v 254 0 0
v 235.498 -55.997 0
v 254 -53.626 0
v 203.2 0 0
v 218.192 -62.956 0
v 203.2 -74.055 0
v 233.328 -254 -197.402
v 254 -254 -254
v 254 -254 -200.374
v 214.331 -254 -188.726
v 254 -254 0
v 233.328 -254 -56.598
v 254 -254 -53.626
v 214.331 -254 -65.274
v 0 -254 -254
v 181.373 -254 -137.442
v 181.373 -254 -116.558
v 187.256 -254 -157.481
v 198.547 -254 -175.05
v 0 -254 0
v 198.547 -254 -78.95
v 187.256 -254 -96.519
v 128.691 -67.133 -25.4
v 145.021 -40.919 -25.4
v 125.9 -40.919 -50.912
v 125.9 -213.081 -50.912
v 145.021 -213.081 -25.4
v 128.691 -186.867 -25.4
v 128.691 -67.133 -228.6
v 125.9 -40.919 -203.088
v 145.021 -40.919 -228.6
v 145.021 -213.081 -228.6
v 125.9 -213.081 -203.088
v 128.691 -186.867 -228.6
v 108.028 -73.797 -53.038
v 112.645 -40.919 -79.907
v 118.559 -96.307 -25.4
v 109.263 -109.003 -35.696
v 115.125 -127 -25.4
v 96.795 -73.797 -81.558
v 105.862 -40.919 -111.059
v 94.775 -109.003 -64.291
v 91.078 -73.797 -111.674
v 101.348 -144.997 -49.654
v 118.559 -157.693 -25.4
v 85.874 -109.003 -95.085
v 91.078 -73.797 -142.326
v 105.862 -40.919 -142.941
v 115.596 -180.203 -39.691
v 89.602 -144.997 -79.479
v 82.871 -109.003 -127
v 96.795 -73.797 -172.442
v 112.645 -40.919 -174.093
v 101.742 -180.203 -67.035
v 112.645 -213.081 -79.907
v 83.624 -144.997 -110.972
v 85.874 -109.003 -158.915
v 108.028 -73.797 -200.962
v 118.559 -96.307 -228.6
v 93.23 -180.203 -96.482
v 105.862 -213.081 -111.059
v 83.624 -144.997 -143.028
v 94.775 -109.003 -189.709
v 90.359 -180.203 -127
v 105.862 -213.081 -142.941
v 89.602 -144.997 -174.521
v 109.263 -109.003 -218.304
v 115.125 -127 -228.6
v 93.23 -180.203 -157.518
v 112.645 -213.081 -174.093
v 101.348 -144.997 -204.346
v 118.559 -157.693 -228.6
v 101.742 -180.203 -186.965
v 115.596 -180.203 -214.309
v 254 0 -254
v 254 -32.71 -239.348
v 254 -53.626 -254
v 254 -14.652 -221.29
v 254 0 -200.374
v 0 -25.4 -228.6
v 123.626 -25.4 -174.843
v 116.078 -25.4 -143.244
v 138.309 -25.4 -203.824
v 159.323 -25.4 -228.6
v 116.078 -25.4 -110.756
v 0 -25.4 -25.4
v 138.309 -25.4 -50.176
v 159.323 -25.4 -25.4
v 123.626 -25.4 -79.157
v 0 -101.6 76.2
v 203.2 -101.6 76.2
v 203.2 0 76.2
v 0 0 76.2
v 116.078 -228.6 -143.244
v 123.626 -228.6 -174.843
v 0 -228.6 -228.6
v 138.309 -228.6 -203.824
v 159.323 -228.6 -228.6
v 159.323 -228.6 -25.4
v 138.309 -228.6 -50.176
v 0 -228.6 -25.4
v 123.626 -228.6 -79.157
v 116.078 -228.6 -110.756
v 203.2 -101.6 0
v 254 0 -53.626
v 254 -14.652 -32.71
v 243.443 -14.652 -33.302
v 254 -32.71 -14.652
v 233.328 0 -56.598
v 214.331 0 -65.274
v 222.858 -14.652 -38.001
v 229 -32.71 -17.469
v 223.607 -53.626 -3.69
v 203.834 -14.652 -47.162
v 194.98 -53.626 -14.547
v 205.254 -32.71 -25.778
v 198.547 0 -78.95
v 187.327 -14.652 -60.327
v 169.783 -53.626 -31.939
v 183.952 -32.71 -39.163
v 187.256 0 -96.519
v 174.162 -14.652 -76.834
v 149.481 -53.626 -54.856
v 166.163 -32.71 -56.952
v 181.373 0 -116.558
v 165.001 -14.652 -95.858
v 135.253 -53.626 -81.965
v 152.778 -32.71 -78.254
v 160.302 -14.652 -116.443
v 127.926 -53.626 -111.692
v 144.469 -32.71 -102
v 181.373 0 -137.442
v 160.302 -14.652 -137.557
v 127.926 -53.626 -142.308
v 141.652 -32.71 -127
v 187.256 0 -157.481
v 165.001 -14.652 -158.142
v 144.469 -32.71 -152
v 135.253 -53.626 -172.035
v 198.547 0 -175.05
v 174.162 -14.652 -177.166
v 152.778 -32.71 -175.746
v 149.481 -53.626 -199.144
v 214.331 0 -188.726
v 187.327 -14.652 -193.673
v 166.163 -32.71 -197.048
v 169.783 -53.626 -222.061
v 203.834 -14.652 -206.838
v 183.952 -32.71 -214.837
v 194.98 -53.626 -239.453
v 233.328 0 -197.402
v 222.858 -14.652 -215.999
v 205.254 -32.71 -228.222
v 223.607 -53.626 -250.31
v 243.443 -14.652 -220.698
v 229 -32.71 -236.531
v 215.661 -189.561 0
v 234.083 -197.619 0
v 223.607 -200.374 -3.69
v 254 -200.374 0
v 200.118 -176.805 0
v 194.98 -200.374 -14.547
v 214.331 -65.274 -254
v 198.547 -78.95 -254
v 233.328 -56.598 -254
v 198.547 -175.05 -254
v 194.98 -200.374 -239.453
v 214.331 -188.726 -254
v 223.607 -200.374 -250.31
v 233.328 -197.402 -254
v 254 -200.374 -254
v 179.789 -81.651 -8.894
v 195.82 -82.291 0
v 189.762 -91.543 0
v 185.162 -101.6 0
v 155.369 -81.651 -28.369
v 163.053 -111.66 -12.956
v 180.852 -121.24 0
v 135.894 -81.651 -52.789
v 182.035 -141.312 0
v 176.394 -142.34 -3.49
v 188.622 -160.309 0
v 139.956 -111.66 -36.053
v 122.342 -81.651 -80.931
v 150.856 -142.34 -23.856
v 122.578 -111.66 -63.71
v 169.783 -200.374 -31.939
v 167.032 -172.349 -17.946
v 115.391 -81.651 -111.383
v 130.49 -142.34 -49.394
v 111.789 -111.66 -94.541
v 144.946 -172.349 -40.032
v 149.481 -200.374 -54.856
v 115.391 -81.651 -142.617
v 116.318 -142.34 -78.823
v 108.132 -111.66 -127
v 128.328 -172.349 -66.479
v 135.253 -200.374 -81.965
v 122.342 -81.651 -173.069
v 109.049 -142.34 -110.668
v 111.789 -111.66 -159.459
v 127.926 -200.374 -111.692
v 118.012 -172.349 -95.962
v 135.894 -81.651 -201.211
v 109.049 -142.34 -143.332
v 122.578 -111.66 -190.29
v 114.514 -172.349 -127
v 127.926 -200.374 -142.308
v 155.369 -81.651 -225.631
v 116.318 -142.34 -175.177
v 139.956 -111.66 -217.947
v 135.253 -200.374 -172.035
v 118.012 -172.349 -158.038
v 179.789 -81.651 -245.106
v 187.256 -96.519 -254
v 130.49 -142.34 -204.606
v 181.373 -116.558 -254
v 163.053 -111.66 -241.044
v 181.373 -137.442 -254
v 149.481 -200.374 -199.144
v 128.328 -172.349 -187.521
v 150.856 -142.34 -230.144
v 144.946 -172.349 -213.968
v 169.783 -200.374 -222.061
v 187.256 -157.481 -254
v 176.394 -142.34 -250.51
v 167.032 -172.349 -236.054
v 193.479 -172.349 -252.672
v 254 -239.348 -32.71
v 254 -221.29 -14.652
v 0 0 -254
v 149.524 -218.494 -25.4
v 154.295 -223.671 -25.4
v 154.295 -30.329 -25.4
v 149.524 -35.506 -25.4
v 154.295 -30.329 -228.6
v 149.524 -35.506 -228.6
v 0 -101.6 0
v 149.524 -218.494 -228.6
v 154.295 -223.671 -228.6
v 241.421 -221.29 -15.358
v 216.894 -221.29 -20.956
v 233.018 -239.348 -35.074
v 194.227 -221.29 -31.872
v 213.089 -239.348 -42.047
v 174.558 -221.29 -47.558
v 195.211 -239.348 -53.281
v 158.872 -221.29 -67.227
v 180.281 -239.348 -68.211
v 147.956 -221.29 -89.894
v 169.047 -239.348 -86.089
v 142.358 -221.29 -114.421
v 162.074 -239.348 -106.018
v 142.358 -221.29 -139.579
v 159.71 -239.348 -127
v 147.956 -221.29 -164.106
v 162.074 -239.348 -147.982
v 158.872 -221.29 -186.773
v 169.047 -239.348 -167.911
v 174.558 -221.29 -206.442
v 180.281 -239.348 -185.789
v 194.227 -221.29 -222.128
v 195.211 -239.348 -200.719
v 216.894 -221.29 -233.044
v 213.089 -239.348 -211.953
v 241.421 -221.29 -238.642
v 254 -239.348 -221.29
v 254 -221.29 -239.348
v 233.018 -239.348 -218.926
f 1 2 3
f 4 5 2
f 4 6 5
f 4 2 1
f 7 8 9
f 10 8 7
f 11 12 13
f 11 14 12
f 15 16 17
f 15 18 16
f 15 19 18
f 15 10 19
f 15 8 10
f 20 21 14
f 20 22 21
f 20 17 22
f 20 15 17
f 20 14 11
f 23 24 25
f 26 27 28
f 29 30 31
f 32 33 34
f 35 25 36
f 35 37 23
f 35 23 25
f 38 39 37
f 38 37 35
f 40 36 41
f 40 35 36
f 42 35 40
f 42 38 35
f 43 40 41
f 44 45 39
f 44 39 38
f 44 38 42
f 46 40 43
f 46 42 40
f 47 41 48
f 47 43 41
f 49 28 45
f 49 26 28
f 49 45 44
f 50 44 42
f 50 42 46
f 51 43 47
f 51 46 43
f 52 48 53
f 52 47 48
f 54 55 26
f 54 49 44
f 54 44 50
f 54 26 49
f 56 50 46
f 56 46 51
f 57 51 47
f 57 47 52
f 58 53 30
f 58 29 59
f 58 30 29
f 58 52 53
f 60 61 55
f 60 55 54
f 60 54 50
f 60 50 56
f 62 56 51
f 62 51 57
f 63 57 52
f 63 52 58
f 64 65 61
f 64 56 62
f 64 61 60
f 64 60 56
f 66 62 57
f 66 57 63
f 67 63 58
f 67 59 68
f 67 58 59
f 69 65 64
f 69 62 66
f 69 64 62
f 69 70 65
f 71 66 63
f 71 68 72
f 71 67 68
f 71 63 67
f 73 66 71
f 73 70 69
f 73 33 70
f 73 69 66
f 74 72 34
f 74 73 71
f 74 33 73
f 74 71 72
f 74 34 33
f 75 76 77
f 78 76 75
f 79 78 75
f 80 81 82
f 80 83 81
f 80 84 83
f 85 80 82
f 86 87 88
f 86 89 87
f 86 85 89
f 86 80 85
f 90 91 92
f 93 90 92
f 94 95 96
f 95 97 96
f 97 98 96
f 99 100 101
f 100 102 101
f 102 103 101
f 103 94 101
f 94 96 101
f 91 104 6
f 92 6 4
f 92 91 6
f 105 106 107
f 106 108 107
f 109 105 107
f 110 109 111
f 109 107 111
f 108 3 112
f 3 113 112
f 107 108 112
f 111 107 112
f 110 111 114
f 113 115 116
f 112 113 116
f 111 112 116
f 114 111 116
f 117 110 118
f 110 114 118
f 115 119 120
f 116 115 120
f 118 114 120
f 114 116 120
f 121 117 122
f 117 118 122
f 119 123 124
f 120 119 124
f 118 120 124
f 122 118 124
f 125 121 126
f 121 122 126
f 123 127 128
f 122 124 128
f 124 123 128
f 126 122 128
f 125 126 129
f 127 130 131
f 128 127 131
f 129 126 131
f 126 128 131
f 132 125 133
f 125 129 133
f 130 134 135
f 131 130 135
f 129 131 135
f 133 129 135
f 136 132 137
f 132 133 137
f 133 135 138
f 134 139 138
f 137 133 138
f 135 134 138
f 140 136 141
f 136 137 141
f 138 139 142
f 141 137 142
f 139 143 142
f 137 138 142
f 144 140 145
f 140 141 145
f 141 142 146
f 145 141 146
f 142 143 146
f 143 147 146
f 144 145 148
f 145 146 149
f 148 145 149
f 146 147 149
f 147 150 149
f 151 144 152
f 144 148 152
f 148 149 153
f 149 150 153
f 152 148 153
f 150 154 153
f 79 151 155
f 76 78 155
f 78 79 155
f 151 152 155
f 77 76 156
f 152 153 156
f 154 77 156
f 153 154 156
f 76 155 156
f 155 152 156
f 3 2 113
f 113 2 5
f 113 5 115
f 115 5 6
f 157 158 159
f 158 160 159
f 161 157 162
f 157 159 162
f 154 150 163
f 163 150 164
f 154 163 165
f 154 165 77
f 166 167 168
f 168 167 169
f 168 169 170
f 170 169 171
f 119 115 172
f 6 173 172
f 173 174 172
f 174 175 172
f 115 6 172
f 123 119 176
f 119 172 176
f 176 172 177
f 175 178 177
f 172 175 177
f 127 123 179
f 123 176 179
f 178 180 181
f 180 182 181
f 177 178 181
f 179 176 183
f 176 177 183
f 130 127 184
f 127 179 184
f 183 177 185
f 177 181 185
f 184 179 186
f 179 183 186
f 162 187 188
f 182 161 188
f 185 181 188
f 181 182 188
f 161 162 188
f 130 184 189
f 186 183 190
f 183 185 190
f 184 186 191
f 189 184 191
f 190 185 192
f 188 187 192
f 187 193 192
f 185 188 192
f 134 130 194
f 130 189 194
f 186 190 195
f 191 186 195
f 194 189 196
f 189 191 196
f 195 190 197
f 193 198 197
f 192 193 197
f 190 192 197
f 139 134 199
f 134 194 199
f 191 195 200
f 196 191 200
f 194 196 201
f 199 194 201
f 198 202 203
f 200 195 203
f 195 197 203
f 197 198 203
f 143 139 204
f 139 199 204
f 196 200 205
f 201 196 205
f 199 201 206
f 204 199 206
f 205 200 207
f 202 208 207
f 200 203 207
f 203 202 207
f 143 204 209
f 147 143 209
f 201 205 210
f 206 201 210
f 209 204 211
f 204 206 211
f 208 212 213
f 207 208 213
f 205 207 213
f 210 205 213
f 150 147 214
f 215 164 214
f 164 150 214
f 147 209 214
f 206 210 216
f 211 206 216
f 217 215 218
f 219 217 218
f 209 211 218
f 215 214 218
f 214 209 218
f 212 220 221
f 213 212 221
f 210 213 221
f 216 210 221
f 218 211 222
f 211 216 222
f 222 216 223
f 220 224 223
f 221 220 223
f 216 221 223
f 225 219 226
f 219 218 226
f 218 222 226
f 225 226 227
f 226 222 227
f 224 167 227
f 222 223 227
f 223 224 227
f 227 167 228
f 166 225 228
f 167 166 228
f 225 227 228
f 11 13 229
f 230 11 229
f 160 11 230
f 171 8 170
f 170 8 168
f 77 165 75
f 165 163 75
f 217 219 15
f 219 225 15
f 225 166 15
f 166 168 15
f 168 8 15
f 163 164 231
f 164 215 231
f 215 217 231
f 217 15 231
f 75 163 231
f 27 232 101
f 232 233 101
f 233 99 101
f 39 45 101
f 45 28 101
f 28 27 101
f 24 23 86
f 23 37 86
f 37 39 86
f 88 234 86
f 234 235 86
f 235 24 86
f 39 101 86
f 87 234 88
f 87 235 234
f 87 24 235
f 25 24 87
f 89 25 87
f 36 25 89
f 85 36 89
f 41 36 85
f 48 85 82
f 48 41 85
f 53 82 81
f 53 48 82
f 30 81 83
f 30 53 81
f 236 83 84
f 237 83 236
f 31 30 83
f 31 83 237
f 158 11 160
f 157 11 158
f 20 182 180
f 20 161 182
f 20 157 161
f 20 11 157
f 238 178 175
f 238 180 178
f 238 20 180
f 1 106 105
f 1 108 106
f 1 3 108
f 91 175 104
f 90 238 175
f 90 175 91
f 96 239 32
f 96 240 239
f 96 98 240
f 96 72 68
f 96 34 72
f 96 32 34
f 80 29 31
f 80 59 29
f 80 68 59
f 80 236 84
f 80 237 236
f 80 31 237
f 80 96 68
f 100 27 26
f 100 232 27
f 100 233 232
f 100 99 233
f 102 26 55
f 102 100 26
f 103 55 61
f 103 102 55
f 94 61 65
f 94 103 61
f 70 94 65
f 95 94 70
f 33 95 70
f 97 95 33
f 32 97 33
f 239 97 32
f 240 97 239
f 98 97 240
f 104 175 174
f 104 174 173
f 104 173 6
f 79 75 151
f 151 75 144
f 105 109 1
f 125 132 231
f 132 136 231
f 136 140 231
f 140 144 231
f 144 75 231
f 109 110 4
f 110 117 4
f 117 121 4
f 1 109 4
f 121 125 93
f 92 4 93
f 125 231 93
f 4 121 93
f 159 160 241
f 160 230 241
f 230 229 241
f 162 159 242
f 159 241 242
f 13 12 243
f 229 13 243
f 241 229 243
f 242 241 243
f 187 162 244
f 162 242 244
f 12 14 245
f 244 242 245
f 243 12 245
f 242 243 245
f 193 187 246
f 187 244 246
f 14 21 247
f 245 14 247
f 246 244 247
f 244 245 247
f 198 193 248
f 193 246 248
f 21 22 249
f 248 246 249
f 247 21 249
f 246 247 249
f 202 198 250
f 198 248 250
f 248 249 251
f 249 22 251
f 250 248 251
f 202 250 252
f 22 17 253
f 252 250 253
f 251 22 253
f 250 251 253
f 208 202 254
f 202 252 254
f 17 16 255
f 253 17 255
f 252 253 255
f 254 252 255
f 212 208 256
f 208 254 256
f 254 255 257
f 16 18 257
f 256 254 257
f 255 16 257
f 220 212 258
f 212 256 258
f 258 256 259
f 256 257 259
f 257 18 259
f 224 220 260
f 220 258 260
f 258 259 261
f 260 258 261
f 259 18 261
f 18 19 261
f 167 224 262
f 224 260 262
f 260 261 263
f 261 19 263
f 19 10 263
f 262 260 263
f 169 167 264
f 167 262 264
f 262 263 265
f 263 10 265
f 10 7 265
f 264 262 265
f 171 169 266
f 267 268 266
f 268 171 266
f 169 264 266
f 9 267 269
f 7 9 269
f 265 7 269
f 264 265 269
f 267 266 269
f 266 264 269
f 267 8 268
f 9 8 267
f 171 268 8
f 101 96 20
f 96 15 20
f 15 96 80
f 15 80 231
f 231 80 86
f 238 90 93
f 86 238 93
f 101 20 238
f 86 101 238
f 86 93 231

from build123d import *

# Parameters (mm, degrees)
F0_W     = 254
F0_H     = 254
F1_DEPTH = 254
F4_T     = -25.4
F7_W     = 101.6
F7_H     = 76.2
F5_DEPTH = 203.2


with BuildPart() as f1:
    # F0 (on Right) → F1 (new body)
    with BuildSketch(Plane.YZ):
        with Locations((-127, -127)):
            Rectangle(F0_W, F0_H)
    extrude(amount=F1_DEPTH)

    # F2 (on face) → F3 (revolve, cut)
    with BuildSketch(Plane.YZ.offset(254)):
        with BuildLine():
            Line((-200.374284178, 0), (-53.625715822, 0))
            ThreePointArc((-53.625715822, 0), (-127, 19.6723749676), (-200.374284178, 0))
        make_face()
        with BuildLine():
            Line((0, -127), (0, -53.625715822))
            ThreePointArc((0, -53.625715822), (-23.2869690477, -23.2869690477), (-53.625715822, 0))
            Line((-53.625715822, 0), (-200.374284178, 0))
            ThreePointArc((-200.374284178, 0), (-230.7130309523, -23.2869690477), (-254, -53.625715822))
            Line((-254, -53.625715822), (-254, -127))
            Line((-254, -127), (0, -127))
        make_face()
        with BuildLine():
            Line((0, -127), (19.6723749676, -127))
            ThreePointArc((19.6723749676, -127), (14.6689401378, -89.0171488843), (0, -53.625715822))
            Line((0, -53.625715822), (0, -127))
        make_face()
        with BuildLine():
            Line((-273.6723749676, -127), (-254, -127))
            Line((-254, -127), (-254, -53.625715822))
            ThreePointArc((-254, -53.625715822), (-268.6689401378, -89.0171488843), (-273.6723749676, -127))
        make_face()
    revolve(axis=Axis((254, -127, -127), (0, -1, 0)), mode=Mode.SUBTRACT)

    # F4
    f4_openings = [f1.faces().sort_by_distance(p)[0] for p in [
        (0, -127, -127),
    ]]
    offset(amount=F4_T, openings=f4_openings)

    # F7 (on Right) → F5 (join)
    with BuildSketch(Plane.YZ):
        with Locations((-50.8, 38.1)):
            Rectangle(F7_W, F7_H)
    extrude(amount=F5_DEPTH)


solid = f1.part
